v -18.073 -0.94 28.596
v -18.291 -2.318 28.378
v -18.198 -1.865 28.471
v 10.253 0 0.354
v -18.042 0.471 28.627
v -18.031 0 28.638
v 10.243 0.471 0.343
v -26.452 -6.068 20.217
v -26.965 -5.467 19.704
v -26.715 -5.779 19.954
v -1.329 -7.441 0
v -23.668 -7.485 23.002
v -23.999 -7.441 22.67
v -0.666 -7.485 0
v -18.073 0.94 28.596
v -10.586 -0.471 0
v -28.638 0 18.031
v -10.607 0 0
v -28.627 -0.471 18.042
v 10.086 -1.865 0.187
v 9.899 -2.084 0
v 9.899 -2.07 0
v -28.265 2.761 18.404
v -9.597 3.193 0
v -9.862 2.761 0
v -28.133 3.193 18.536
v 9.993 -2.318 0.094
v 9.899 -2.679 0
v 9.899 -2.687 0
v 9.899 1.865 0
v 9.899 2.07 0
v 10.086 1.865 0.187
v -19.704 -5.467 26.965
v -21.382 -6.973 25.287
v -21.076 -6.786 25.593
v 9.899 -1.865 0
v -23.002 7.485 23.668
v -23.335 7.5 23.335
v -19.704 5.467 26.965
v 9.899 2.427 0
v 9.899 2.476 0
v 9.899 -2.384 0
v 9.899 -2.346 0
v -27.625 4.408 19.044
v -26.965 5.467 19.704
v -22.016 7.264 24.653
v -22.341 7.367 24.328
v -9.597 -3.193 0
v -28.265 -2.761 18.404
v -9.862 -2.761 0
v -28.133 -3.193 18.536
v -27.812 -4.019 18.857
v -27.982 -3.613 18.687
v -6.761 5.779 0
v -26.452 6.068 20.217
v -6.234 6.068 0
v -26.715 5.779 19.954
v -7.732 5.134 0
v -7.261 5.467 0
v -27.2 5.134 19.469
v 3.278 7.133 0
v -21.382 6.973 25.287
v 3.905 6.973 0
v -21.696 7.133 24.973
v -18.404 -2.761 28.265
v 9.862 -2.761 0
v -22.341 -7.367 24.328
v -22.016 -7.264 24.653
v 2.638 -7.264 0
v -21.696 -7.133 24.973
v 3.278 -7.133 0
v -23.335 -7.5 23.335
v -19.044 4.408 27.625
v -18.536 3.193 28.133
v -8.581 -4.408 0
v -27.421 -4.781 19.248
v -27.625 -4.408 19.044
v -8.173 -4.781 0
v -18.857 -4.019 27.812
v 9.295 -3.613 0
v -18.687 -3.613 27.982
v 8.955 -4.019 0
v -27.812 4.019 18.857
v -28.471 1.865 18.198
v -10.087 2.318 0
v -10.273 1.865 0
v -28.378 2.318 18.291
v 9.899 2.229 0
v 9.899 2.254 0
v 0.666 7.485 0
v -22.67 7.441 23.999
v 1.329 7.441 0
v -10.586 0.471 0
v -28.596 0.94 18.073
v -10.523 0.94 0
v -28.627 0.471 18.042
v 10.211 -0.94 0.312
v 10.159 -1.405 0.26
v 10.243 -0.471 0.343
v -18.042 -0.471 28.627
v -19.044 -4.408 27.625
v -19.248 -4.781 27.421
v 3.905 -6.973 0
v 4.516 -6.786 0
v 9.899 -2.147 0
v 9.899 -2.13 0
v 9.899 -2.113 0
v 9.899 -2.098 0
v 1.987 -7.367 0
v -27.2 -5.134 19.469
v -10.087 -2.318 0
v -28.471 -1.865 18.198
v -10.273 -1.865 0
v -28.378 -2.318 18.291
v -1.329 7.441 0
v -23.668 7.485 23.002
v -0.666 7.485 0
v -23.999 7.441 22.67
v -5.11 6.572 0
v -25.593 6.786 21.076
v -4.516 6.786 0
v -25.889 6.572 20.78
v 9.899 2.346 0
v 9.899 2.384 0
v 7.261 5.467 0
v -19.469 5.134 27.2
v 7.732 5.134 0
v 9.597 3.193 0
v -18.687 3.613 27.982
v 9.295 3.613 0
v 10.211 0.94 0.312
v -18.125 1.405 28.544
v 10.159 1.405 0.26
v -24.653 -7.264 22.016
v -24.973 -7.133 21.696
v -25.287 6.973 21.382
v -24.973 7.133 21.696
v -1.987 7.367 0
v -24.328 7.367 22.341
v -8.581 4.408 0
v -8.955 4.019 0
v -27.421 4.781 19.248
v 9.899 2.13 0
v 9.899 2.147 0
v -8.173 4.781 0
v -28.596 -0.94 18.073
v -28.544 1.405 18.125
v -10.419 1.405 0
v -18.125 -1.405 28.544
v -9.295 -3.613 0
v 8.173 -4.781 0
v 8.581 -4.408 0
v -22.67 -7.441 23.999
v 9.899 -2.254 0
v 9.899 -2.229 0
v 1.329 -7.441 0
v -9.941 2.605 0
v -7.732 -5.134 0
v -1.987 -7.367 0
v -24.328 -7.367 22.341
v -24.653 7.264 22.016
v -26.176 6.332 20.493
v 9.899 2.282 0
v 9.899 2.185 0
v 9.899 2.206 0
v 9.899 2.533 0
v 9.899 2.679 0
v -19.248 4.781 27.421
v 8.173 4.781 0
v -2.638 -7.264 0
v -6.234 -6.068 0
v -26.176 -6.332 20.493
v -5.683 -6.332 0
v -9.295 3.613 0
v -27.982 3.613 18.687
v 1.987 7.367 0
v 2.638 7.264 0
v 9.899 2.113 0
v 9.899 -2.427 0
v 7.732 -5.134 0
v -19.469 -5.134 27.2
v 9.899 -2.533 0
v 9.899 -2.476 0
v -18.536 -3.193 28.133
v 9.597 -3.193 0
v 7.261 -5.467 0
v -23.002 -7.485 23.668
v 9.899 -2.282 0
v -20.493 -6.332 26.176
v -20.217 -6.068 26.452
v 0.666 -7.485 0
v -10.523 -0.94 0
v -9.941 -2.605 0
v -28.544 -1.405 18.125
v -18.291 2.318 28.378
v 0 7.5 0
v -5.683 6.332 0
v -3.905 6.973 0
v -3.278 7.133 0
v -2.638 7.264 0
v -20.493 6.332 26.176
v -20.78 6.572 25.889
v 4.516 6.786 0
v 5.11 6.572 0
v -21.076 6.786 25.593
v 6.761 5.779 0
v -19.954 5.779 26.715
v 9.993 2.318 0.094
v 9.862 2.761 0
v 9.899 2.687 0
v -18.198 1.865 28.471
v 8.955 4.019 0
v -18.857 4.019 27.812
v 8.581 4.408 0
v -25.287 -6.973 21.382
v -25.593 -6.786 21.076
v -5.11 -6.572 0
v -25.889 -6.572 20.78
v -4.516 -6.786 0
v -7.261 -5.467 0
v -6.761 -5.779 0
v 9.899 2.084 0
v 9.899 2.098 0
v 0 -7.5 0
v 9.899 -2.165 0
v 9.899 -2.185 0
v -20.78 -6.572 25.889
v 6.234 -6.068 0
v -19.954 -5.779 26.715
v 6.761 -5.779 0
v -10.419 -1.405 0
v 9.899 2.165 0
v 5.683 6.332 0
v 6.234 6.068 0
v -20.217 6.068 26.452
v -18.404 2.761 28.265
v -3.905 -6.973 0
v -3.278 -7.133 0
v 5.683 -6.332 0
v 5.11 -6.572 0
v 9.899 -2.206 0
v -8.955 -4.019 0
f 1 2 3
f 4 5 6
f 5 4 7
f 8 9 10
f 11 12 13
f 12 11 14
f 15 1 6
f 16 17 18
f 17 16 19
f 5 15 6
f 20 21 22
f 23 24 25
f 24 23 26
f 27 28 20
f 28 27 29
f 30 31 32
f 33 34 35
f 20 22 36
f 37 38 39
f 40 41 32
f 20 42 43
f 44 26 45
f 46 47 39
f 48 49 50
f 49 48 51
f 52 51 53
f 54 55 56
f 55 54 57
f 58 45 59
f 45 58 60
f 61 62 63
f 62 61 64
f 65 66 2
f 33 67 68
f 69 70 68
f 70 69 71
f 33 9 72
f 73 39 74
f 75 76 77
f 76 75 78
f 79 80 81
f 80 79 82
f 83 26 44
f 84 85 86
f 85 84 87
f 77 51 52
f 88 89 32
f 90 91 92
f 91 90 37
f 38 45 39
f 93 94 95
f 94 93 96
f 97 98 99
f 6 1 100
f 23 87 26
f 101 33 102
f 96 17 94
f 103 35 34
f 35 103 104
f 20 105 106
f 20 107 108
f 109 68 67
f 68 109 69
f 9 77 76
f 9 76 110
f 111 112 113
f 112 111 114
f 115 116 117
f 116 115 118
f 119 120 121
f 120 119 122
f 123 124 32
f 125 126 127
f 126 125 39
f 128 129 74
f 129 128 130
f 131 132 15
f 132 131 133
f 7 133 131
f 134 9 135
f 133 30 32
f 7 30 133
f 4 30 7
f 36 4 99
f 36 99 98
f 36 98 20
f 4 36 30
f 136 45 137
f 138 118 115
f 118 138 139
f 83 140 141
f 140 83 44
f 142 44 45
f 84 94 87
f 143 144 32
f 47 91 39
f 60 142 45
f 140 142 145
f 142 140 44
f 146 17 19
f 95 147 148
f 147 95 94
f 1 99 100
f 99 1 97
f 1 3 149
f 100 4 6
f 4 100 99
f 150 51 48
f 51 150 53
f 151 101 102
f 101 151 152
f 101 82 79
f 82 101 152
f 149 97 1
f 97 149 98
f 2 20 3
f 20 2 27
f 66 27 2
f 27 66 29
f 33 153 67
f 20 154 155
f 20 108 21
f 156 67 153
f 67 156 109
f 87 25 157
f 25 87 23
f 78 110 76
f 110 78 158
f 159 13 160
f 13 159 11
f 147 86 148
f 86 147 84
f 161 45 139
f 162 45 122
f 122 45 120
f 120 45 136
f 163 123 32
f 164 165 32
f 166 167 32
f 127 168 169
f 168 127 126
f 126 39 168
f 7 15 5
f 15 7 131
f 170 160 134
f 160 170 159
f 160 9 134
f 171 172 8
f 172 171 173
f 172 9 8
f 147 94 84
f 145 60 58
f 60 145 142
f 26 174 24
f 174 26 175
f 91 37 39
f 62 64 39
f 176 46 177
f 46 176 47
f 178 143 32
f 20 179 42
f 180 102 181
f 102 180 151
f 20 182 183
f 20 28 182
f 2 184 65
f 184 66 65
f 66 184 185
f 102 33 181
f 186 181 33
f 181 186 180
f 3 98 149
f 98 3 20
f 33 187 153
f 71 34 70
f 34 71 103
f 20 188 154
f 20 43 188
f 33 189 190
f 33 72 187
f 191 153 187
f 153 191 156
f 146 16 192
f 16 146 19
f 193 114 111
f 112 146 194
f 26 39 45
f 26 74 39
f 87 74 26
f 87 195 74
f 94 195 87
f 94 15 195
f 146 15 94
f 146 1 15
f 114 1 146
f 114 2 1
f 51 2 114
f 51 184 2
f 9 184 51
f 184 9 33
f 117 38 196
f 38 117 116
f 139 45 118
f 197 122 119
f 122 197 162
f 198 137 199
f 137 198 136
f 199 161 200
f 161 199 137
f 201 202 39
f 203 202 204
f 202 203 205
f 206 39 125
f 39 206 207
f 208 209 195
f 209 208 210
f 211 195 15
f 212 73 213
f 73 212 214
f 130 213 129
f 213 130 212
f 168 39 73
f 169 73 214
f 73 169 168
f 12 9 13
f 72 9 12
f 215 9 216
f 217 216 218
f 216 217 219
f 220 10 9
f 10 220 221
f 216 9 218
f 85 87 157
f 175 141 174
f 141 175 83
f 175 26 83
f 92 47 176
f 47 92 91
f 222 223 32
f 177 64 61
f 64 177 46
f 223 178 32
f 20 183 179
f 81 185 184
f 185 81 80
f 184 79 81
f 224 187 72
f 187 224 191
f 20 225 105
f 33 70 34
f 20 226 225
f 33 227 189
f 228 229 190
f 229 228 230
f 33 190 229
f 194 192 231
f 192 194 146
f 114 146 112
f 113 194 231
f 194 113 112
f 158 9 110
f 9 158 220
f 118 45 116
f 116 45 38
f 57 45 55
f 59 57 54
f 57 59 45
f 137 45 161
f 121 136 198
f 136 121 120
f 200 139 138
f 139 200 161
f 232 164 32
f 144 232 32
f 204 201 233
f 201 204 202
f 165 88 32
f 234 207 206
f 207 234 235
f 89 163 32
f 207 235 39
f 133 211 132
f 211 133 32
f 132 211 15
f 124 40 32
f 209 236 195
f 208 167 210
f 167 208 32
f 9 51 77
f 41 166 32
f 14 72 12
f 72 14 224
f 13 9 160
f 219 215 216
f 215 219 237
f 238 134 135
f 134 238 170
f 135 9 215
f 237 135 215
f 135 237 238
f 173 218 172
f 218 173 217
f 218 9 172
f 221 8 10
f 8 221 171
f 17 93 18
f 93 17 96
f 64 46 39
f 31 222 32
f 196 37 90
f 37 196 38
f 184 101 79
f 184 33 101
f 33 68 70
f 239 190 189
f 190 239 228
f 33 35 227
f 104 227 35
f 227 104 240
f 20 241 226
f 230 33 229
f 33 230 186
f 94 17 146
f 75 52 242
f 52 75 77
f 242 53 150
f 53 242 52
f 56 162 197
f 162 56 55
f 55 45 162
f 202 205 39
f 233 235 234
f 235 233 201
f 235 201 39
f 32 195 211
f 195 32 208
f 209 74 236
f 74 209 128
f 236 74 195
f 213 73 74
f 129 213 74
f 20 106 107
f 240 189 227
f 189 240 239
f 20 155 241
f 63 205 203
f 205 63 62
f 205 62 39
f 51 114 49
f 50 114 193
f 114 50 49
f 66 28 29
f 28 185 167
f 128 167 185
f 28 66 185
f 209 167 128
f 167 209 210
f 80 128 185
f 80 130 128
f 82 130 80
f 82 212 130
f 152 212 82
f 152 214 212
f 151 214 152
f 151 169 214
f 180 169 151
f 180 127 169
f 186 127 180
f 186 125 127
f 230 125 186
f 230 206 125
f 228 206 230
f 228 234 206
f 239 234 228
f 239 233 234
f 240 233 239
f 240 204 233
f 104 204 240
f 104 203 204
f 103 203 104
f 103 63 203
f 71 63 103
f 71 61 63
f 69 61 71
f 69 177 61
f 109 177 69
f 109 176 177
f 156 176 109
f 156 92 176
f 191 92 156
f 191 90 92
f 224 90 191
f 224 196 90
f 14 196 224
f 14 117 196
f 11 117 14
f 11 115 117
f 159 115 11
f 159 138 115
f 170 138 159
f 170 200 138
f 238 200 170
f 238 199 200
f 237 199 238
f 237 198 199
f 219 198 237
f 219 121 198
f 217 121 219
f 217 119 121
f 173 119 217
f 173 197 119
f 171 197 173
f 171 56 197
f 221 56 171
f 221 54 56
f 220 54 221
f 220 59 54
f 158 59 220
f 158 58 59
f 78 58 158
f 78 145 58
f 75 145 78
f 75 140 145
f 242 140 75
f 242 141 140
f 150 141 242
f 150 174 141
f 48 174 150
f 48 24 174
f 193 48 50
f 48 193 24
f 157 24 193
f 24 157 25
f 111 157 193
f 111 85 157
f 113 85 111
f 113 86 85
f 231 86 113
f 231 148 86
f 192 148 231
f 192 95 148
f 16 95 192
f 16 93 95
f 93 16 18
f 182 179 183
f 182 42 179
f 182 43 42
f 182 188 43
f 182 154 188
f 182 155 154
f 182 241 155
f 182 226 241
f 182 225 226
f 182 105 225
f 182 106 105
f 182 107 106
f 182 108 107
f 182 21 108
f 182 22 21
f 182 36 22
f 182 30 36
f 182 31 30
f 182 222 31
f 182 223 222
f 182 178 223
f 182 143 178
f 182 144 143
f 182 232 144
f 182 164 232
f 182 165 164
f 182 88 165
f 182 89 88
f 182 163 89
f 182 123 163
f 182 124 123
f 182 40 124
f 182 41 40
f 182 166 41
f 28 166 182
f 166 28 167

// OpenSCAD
$fn=100;
h=40;

difference(){
    rotate([0,-45,0])
    translate([0,0,-7]) 
    union(){
        cylinder(d=15,h=h);
        
       // translate([0,0,h])  sphere(7.5);
    }

    //translate([-h*1.2,-15,0])    cube([30,30,30]);
    
    translate([0,0,-15])    cube([30,30,30],center=true);
}    
